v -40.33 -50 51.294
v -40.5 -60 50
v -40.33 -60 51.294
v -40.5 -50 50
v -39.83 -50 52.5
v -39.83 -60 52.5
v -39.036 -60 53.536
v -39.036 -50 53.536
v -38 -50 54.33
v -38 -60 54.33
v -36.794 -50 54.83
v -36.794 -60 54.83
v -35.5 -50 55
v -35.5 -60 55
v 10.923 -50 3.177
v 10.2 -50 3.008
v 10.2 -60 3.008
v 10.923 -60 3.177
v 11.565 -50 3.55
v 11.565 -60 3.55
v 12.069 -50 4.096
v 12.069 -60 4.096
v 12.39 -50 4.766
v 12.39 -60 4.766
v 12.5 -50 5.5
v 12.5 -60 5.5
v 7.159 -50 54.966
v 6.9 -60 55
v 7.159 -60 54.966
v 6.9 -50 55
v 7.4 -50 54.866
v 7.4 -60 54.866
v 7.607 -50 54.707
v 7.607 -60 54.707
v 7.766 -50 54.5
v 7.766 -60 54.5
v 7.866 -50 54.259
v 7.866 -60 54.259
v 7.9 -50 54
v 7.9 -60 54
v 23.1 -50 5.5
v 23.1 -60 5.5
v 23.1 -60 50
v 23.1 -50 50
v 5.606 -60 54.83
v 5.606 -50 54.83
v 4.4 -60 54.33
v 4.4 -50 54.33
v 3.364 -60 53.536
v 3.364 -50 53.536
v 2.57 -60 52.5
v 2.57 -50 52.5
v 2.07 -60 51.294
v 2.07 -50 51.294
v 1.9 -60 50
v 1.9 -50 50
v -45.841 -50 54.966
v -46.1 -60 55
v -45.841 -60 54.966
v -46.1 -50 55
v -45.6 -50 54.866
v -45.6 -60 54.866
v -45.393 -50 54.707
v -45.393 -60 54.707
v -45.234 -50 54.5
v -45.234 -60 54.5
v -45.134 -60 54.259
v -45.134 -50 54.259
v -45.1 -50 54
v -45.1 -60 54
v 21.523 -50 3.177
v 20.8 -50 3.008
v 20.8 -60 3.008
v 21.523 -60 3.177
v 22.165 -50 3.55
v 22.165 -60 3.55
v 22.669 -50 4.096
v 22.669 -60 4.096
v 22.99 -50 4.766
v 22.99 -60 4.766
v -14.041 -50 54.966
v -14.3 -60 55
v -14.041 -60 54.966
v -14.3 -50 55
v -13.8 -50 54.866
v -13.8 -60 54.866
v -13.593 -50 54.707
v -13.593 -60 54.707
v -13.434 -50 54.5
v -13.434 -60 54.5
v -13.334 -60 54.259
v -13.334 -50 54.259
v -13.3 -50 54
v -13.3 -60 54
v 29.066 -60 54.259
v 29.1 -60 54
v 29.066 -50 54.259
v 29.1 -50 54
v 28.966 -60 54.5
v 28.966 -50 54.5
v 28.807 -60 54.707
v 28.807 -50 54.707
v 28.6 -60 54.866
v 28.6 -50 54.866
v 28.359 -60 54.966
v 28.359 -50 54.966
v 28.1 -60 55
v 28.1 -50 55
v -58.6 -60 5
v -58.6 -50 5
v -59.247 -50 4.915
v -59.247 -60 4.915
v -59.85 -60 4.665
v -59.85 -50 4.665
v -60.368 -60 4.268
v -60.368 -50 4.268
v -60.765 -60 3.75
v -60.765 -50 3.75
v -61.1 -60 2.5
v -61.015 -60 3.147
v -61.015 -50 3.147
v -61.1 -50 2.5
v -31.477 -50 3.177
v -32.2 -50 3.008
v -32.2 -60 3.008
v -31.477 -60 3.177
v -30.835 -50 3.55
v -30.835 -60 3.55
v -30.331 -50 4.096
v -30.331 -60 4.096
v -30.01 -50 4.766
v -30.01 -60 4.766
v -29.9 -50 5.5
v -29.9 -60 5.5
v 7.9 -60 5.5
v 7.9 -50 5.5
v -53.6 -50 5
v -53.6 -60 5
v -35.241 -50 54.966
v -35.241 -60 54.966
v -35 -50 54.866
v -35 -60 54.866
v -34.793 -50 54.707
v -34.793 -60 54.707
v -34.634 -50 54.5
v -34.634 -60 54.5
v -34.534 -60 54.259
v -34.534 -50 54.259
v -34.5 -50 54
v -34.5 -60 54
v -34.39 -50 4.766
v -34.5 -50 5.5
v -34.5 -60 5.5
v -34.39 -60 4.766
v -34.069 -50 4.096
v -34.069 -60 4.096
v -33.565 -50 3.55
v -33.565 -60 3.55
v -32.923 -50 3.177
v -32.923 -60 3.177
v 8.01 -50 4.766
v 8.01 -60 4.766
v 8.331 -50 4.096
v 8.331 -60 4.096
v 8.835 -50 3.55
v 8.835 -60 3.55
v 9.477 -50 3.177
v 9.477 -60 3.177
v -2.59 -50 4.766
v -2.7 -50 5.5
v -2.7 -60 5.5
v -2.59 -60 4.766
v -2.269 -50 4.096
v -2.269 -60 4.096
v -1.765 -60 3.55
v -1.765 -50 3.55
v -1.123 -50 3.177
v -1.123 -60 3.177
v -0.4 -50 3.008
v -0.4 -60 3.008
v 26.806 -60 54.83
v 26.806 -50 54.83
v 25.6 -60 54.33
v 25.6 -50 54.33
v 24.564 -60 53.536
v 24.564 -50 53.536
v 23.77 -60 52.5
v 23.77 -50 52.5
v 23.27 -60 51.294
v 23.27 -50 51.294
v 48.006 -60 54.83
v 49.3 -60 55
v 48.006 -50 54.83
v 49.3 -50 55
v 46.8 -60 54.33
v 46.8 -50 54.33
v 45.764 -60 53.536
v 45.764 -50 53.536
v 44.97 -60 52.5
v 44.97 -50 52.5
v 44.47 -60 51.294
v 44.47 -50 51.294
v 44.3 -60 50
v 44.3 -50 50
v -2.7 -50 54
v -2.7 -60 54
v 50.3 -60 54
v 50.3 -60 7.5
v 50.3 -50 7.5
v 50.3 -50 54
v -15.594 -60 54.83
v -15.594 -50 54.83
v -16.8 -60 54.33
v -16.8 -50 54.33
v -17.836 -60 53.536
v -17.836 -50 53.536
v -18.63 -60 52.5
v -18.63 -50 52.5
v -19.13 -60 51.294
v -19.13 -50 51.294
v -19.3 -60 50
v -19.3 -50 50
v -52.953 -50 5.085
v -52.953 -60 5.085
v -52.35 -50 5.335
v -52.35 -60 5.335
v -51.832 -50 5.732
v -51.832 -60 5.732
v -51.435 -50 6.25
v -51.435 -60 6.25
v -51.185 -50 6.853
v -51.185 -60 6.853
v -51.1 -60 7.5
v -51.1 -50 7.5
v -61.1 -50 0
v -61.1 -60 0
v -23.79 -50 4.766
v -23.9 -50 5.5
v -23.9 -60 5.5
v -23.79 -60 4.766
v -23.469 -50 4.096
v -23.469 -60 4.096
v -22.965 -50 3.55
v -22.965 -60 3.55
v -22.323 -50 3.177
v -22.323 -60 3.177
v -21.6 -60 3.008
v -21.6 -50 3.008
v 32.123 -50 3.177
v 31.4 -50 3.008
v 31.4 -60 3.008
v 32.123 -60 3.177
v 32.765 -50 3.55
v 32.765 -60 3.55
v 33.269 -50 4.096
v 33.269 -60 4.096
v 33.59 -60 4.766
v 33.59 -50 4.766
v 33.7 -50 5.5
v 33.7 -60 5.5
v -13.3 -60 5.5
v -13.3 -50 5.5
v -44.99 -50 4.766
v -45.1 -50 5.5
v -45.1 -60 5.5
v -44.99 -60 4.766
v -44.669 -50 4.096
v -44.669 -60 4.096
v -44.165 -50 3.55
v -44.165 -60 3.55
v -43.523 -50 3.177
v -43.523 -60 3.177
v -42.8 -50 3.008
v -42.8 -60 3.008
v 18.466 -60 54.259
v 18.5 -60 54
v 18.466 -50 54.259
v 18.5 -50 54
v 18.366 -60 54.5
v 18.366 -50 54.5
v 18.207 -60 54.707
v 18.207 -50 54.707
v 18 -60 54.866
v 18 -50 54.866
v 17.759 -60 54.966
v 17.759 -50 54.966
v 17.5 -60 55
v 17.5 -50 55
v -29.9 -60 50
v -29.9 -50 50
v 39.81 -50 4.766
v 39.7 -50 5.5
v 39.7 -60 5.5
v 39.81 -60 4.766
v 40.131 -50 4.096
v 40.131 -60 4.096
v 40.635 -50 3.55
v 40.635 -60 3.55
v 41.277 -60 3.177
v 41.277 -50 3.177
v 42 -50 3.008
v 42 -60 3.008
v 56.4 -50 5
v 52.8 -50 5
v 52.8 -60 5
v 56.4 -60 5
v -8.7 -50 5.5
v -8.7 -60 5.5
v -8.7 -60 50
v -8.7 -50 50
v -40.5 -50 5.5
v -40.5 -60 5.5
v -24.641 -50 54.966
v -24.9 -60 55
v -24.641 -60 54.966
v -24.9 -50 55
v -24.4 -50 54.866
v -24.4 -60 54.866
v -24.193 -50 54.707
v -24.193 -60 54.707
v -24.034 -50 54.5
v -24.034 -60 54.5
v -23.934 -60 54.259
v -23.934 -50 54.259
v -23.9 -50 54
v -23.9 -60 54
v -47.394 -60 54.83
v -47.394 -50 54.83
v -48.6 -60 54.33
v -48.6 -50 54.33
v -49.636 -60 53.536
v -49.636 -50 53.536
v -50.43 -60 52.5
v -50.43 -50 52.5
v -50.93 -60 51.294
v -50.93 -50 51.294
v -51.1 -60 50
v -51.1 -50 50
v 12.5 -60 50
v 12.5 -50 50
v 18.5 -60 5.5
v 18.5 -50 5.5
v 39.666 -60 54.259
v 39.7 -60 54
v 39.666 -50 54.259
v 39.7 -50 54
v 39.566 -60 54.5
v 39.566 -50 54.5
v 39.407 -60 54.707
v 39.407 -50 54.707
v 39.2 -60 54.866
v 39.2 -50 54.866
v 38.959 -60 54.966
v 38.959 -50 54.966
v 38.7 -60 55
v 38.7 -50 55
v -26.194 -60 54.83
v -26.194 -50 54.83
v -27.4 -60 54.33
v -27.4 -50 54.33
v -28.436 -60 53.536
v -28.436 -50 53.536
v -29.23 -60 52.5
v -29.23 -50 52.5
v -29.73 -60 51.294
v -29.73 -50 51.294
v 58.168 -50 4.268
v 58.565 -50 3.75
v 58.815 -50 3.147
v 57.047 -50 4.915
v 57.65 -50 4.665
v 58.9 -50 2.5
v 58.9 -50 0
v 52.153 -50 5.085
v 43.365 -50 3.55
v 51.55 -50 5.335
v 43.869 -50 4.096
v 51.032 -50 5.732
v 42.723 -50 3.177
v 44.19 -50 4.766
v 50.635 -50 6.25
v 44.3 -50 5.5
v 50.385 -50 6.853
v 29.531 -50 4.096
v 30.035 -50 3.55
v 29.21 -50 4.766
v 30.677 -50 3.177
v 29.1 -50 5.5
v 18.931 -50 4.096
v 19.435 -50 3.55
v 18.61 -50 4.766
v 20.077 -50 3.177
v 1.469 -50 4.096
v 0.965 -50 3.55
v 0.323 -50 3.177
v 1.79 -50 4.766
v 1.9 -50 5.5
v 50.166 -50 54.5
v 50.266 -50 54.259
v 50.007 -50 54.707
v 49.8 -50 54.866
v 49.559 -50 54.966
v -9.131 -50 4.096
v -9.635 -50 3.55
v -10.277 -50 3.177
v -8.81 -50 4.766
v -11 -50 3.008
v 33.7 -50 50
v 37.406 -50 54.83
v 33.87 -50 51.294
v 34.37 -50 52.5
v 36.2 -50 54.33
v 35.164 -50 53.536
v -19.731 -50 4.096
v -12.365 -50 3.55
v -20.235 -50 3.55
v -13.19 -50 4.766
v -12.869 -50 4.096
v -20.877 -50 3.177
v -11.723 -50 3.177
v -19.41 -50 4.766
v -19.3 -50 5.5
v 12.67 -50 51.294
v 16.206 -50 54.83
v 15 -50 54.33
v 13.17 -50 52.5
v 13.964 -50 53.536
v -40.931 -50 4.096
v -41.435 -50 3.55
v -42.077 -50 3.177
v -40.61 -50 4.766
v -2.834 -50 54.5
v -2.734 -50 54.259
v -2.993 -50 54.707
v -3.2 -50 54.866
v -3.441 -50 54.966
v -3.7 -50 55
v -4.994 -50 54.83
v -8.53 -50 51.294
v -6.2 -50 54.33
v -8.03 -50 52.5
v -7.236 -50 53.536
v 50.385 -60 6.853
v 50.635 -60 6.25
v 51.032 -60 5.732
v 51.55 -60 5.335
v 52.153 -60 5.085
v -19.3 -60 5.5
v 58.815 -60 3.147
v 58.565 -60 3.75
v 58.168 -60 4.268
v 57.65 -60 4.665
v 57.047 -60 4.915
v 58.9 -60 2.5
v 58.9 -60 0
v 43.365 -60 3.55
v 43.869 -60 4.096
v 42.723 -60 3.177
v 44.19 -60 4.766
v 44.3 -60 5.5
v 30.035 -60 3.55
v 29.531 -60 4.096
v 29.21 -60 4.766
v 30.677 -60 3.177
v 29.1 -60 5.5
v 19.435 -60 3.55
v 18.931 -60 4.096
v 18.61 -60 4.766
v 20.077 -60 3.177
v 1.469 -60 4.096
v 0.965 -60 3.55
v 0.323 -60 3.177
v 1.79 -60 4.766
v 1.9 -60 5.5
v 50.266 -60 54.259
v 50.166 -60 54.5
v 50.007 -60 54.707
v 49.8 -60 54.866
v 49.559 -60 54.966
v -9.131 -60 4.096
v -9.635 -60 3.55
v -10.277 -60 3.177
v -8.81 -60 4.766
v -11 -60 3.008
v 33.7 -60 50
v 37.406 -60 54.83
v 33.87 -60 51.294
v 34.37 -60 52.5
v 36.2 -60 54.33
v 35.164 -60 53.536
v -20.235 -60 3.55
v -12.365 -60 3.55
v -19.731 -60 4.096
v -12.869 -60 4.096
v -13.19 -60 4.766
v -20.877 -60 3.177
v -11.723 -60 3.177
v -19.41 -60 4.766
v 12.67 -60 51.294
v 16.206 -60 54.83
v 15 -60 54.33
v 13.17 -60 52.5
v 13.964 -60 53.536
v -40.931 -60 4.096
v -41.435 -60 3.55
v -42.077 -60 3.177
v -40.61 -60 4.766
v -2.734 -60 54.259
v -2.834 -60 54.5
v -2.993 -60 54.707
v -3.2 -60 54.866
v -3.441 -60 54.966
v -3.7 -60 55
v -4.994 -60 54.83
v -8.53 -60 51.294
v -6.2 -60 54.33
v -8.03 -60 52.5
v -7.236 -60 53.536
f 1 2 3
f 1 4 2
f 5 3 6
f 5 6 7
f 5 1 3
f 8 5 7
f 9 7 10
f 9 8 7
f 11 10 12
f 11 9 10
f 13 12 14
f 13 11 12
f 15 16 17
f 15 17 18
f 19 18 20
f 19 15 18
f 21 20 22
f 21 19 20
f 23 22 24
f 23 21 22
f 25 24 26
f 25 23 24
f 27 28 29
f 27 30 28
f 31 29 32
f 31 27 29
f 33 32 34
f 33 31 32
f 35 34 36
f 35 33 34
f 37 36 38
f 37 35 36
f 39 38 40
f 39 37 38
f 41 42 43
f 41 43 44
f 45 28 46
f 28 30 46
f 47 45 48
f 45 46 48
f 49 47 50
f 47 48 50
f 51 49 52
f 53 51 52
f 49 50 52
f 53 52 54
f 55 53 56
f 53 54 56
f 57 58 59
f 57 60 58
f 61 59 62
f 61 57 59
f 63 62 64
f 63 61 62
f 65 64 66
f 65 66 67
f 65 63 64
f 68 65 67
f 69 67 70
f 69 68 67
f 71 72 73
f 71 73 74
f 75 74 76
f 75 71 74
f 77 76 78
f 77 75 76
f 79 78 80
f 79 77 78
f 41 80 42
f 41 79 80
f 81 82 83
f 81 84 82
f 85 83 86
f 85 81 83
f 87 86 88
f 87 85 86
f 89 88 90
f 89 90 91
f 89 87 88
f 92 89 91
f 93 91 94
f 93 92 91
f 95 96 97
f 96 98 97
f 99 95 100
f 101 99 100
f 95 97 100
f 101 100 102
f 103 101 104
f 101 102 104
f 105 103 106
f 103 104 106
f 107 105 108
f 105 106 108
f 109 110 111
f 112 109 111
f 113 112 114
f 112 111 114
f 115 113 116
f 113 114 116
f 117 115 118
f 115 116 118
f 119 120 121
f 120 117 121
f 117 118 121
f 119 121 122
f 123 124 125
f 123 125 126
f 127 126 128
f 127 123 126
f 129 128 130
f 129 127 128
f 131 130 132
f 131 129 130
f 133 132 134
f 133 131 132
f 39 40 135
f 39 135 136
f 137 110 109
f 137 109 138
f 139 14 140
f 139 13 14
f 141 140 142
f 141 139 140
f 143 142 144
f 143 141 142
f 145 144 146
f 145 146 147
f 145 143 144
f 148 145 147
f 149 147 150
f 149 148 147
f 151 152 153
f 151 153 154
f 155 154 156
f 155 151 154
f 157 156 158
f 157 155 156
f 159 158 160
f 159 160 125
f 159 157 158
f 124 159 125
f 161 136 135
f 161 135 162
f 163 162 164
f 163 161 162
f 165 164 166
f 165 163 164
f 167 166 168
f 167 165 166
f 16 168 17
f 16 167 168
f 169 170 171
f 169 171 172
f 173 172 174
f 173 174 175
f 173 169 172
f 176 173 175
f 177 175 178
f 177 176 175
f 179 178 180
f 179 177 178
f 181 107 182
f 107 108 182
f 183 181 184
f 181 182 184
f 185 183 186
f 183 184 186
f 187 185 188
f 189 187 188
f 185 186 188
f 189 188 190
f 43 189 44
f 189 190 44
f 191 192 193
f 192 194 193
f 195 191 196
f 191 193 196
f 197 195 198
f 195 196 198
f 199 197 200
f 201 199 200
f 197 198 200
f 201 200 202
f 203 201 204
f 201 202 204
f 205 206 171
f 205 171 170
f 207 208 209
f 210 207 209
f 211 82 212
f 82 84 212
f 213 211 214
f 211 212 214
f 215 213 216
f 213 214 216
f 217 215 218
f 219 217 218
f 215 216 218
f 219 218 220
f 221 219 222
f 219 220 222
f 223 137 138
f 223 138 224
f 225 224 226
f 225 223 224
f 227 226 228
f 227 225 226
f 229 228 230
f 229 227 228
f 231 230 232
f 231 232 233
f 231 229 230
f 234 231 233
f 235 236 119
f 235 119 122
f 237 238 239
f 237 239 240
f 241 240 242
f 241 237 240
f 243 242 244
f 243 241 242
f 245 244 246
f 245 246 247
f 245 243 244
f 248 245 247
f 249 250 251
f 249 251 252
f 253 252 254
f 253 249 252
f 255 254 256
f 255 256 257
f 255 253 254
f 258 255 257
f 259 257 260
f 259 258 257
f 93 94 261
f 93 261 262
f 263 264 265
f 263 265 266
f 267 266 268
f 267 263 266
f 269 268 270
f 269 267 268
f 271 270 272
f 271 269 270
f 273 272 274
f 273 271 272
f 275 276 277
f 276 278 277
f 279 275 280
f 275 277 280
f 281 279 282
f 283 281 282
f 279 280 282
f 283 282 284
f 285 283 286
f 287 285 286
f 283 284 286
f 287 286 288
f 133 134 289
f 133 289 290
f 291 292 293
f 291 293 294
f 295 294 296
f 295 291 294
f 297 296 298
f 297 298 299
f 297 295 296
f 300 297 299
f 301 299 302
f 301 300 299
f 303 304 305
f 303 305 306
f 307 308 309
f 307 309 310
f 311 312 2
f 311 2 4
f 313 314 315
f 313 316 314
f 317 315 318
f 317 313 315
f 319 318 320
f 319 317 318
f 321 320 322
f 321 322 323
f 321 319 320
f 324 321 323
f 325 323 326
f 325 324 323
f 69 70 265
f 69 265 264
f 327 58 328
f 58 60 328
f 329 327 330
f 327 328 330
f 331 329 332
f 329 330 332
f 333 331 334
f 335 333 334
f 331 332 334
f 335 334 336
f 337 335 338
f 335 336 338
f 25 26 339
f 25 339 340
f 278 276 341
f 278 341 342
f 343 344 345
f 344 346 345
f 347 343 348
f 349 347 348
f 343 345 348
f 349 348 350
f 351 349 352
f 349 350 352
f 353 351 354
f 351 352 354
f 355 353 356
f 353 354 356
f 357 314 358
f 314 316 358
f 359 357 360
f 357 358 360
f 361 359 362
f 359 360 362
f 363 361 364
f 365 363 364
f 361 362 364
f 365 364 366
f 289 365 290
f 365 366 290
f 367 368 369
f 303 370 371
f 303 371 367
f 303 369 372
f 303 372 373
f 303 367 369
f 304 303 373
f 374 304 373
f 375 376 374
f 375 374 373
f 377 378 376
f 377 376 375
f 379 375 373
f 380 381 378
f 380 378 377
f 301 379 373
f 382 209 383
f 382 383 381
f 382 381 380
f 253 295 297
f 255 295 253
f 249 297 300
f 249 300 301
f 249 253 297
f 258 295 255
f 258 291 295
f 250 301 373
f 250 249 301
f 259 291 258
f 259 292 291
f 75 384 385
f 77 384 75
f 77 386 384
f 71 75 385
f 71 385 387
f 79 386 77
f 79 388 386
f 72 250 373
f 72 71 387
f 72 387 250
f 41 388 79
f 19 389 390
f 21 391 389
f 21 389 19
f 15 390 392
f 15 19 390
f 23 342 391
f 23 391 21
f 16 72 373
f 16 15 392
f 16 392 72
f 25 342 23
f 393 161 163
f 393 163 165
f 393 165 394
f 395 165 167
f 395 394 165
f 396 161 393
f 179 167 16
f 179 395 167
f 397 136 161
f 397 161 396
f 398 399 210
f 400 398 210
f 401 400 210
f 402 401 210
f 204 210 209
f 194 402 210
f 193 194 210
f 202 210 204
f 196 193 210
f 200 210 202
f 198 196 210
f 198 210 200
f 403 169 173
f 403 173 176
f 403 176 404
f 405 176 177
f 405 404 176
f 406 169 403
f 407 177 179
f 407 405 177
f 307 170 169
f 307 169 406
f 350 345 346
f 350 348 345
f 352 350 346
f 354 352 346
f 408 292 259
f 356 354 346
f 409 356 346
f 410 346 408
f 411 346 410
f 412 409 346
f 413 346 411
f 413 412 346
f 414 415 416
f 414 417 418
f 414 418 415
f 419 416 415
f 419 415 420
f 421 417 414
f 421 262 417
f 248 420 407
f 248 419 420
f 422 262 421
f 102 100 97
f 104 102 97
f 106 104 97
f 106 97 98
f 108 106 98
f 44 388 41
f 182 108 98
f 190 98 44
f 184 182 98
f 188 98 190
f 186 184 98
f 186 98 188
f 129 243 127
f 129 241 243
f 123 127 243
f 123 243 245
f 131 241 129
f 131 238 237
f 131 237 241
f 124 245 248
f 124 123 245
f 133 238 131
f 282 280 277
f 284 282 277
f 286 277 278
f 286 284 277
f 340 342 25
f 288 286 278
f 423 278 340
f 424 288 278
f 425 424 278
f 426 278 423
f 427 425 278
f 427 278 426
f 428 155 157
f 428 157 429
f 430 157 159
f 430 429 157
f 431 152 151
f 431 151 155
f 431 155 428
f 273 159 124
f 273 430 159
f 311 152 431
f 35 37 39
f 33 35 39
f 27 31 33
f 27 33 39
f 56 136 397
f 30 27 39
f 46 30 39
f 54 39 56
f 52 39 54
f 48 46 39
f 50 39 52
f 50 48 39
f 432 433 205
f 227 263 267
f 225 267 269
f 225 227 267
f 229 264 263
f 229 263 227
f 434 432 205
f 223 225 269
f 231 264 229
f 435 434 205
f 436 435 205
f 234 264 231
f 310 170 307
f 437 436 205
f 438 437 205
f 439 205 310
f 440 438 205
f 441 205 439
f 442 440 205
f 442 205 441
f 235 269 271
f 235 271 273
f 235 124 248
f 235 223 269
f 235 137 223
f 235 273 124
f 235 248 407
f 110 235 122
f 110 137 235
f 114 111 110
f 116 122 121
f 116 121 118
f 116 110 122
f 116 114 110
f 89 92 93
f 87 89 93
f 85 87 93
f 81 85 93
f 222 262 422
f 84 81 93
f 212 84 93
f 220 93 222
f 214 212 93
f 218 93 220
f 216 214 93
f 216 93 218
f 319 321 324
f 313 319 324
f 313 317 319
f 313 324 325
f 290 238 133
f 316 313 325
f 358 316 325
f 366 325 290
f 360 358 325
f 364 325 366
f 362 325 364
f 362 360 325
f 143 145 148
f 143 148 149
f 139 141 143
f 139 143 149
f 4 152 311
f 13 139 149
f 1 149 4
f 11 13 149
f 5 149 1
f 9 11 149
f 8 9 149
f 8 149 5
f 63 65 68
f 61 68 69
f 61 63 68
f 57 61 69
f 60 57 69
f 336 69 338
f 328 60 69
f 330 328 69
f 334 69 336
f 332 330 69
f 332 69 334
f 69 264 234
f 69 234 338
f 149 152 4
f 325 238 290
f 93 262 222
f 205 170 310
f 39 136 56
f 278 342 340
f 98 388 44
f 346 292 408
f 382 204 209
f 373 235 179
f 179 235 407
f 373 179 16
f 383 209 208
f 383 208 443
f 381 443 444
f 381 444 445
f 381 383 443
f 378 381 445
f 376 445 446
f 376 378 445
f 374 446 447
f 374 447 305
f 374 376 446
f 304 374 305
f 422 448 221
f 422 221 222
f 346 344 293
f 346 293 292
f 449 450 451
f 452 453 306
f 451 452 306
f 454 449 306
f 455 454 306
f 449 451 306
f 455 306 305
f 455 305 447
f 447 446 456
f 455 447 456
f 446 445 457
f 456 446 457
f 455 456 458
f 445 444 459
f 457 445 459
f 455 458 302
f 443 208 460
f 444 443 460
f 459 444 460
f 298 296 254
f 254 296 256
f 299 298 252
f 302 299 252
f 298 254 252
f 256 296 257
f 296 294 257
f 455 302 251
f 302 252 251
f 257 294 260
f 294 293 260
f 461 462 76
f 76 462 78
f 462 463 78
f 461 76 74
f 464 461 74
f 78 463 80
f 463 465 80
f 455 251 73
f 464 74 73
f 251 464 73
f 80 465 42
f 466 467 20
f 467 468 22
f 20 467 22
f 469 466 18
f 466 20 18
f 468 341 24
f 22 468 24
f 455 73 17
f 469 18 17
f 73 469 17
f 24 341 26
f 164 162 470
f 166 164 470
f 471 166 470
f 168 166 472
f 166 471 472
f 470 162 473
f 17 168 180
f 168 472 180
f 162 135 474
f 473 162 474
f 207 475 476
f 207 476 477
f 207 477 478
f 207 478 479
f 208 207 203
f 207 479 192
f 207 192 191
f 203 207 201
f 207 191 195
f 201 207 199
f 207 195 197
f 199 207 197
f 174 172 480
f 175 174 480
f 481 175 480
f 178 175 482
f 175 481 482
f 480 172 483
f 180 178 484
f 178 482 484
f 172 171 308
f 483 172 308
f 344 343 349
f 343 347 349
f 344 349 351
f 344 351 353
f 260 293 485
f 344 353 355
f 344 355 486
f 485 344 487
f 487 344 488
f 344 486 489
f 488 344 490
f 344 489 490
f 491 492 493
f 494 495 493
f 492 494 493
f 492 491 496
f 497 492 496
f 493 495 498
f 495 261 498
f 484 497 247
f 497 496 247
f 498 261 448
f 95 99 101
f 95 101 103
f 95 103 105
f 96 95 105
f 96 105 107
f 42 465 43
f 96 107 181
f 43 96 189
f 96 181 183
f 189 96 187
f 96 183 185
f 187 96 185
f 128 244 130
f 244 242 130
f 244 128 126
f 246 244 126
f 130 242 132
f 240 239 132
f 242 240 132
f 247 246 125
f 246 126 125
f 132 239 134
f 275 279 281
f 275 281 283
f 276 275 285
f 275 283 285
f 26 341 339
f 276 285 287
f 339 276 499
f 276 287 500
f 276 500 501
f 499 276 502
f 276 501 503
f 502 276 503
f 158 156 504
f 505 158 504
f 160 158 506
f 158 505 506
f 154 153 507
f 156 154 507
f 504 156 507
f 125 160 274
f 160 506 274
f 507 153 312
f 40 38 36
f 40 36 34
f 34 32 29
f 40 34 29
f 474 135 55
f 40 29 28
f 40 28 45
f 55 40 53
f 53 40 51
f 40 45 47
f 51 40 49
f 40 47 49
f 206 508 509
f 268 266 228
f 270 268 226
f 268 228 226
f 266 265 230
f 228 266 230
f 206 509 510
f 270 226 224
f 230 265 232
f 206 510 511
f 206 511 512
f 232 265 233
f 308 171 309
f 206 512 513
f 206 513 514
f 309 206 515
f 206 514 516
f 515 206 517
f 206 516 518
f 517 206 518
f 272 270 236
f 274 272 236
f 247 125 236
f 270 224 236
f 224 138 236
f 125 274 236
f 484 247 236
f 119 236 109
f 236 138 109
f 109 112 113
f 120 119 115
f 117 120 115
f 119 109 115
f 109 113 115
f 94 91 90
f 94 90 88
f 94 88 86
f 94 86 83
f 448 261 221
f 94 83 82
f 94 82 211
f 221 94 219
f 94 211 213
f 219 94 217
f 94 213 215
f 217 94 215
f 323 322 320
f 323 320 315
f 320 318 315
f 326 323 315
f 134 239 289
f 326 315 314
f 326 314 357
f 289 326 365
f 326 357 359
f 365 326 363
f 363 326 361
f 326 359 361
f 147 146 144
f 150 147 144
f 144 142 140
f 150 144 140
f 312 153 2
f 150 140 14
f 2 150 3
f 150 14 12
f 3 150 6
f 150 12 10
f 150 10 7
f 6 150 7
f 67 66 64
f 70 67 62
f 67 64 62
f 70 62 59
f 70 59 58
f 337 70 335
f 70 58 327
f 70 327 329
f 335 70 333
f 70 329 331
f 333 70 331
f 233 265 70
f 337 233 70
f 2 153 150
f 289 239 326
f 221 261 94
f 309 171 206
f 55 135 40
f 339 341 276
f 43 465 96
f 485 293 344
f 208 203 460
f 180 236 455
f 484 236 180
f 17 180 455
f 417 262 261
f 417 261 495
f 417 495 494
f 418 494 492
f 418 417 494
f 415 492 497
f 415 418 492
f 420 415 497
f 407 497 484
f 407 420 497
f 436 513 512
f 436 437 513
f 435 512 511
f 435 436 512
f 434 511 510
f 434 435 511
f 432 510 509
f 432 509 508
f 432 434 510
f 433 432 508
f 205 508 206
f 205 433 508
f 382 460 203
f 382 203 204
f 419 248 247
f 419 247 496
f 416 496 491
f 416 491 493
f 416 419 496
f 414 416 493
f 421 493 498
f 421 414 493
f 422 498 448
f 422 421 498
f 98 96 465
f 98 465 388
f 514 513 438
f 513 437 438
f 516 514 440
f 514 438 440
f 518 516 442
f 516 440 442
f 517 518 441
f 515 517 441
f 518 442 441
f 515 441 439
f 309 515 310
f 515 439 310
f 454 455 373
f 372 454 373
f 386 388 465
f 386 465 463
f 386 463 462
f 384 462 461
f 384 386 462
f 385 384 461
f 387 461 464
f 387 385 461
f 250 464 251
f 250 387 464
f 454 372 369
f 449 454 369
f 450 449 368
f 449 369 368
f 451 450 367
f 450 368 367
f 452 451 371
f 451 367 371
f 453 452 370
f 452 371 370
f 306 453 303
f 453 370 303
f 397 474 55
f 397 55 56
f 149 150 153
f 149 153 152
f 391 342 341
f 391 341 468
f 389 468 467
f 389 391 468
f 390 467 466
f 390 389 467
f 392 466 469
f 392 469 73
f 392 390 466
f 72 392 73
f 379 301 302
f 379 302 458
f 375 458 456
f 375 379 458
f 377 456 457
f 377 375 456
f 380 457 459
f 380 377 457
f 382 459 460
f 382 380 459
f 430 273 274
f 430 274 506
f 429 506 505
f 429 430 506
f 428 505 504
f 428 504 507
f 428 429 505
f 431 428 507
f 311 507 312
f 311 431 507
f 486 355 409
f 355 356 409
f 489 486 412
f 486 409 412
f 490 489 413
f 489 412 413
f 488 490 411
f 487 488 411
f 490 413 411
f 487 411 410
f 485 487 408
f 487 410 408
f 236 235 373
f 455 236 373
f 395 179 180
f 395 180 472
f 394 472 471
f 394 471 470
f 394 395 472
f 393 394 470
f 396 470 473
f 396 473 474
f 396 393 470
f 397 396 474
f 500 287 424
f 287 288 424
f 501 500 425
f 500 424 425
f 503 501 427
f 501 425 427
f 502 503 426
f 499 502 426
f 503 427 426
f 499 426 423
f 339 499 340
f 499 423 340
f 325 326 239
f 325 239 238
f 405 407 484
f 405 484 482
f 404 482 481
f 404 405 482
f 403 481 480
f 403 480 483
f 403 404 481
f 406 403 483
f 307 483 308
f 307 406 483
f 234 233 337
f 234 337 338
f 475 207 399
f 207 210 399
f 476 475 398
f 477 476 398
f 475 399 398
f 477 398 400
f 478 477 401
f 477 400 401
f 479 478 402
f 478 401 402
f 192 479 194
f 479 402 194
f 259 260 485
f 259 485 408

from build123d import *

# Parameters (mm, degrees)
F0_W        = 120
F0_H        = 10
F1_DEPTH    = 5
F2_W        = 6
F2_H        = 10
F3_DEPTH    = 50
F4_W        = 4.6
F4_H        = 10
F5_DEPTH    = 2
F6_T1_DEPTH = 10
F6_T3_DEPTH = 22.5
F7_R        = 5
F8_R        = 0.99999


# Not quite as in the source:
# - a fillet or chamfer that OpenCascade refuses, or shapes differently, is made with other operations: its cross-section is extruded or revolved along the edge and cut away or added
# - a fillet or chamfer is up to 0.001 mm smaller than in the source, because OpenCascade refuses the exact size


with BuildPart() as f1:
    # F0 (on Top) → F1 (new body)
    with BuildSketch(Plane.XY):
        with Locations((-1.1, -55)):
            Rectangle(F0_W, F0_H)
    extrude(amount=F1_DEPTH)

    # F2 (on face) → F3 (join)
    with BuildSketch(Plane.XY.offset(5)):
        with Locations((-48.1, -55)):
            Rectangle(F2_W, F2_H)
        with Locations((-37.5, -55)):
            Rectangle(F2_W, F2_H)
        with Locations((-26.9, -55)):
            Rectangle(F2_W, F2_H)
        with Locations((-16.3, -55)):
            Rectangle(F2_W, F2_H)
        with Locations((-5.7, -55)):
            Rectangle(F2_W, F2_H)
        with Locations((4.9, -55)):
            Rectangle(F2_W, F2_H)
        with Locations((15.5, -55)):
            Rectangle(F2_W, F2_H)
        with Locations((26.1, -55)):
            Rectangle(F2_W, F2_H)
        with Locations((36.7, -55)):
            Rectangle(F2_W, F2_H)
        with Locations((47.3, -55)):
            Rectangle(F2_W, F2_H)
    extrude(amount=F3_DEPTH)

    # F4 (on face) → F5 (cut)
    with BuildSketch(Plane.XY.offset(5)):
        with Locations((-42.8, -55)):
            Rectangle(F4_W, F4_H)
        with Locations((-32.2, -55)):
            Rectangle(F4_W, F4_H)
        with Locations((-21.6, -55)):
            Rectangle(F4_W, F4_H)
        with Locations((-11, -55)):
            Rectangle(F4_W, F4_H)
        with Locations((-0.4, -55)):
            Rectangle(F4_W, F4_H)
        with Locations((10.2, -55)):
            Rectangle(F4_W, F4_H)
        with Locations((20.8, -55)):
            Rectangle(F4_W, F4_H)
        with Locations((31.4, -55)):
            Rectangle(F4_W, F4_H)
        with Locations((42, -55)):
            Rectangle(F4_W, F4_H)
    extrude(amount=-F5_DEPTH, mode=Mode.SUBTRACT)

    # F6: fillet of radius 2.5 on 22 edges, made by hand

    # F6_s2 → F6_t1 (join)
    with BuildSketch(Plane.XZ.offset(50)):
        with BuildLine():
            ThreePointArc((-45.1, 5.5), (-44.367766953, 3.732233047), (-42.6, 3))
            Line((-42.6, 3), (-45.1, 3))
            Line((-45.1, 3), (-45.1, 5.5))
        make_face()
        with BuildLine():
            ThreePointArc((-43, 3), (-41.232233047, 3.732233047), (-40.5, 5.5))
            Line((-40.5, 5.5), (-40.5, 3))
            Line((-40.5, 3), (-43, 3))
        make_face()
        with BuildLine():
            ThreePointArc((-32.4, 3), (-30.632233047, 3.732233047), (-29.9, 5.5))
            Line((-29.9, 5.5), (-29.9, 3))
            Line((-29.9, 3), (-32.4, 3))
        make_face()
        with BuildLine():
            ThreePointArc((-23.9, 5.5), (-23.167766953, 3.732233047), (-21.4, 3))
            Line((-21.4, 3), (-23.9, 3))
            Line((-23.9, 3), (-23.9, 5.5))
        make_face()
        with BuildLine():
            ThreePointArc((-21.8, 3), (-20.032233047, 3.732233047), (-19.3, 5.5))
            Line((-19.3, 5.5), (-19.3, 3))
            Line((-19.3, 3), (-21.8, 3))
        make_face()
        with BuildLine():
            ThreePointArc((-13.3, 5.5), (-12.567766953, 3.732233047), (-10.8, 3))
            Line((-10.8, 3), (-13.3, 3))
            Line((-13.3, 3), (-13.3, 5.5))
        make_face()
        with BuildLine():
            ThreePointArc((-11.2, 3), (-9.432233047, 3.732233047), (-8.7, 5.5))
            Line((-8.7, 5.5), (-8.7, 3))
            Line((-8.7, 3), (-11.2, 3))
        make_face()
        with BuildLine():
            ThreePointArc((-2.7, 5.5), (-1.967766953, 3.732233047), (-0.2, 3))
            Line((-0.2, 3), (-2.7, 3))
            Line((-2.7, 3), (-2.7, 5.5))
        make_face()
        with BuildLine():
            ThreePointArc((-0.6, 3), (1.167766953, 3.732233047), (1.9, 5.5))
            Line((1.9, 5.5), (1.9, 3))
            Line((1.9, 3), (-0.6, 3))
        make_face()
        with BuildLine():
            ThreePointArc((10, 3), (11.767766953, 3.732233047), (12.5, 5.5))
            Line((12.5, 5.5), (12.5, 3))
            Line((12.5, 3), (10, 3))
        make_face()
        with BuildLine():
            ThreePointArc((20.6, 3), (22.367766953, 3.732233047), (23.1, 5.5))
            Line((23.1, 5.5), (23.1, 3))
            Line((23.1, 3), (20.6, 3))
        make_face()
        with BuildLine():
            ThreePointArc((31.2, 3), (32.967766953, 3.732233047), (33.7, 5.5))
            Line((33.7, 5.5), (33.7, 3))
            Line((33.7, 3), (31.2, 3))
        make_face()
        with BuildLine():
            ThreePointArc((41.8, 3), (43.567766953, 3.732233047), (44.3, 5.5))
            Line((44.3, 5.5), (44.3, 3))
            Line((44.3, 3), (41.8, 3))
        make_face()
        with BuildLine():
            ThreePointArc((39.7, 5.5), (40.432233047, 3.732233047), (42.2, 3))
            Line((42.2, 3), (39.7, 3))
            Line((39.7, 3), (39.7, 5.5))
        make_face()
        with BuildLine():
            ThreePointArc((29.1, 5.5), (29.832233047, 3.732233047), (31.6, 3))
            Line((31.6, 3), (29.1, 3))
            Line((29.1, 3), (29.1, 5.5))
        make_face()
        with BuildLine():
            ThreePointArc((18.5, 5.5), (19.232233047, 3.732233047), (21, 3))
            Line((21, 3), (18.5, 3))
            Line((18.5, 3), (18.5, 5.5))
        make_face()
        with BuildLine():
            ThreePointArc((7.9, 5.5), (8.632233047, 3.732233047), (10.4, 3))
            Line((10.4, 3), (7.9, 3))
            Line((7.9, 3), (7.9, 5.5))
        make_face()
        with BuildLine():
            ThreePointArc((50.3, 7.5), (51.032233047, 5.732233047), (52.8, 5))
            Line((52.8, 5), (50.3, 5))
            Line((50.3, 5), (50.3, 7.5))
        make_face()
        with BuildLine():
            ThreePointArc((-53.6, 5), (-51.832233047, 5.732233047), (-51.1, 7.5))
            Line((-51.1, 7.5), (-51.1, 5))
            Line((-51.1, 5), (-53.6, 5))
        make_face()
        with BuildLine():
            ThreePointArc((-34.5, 5.5), (-33.767766953, 3.732233047), (-32, 3))
            Line((-32, 3), (-34.5, 3))
            Line((-34.5, 3), (-34.5, 5.5))
        make_face()
    extrude(amount=F6_T1_DEPTH)

    # F6_s4 → F6_t3 (cut)
    with BuildSketch(Plane.XZ.offset(43.75)):
        with BuildLine():
            ThreePointArc((58.9, 2.5), (58.167766953, 4.267766953), (56.4, 5))
            Line((56.4, 5), (58.9, 5))
            Line((58.9, 5), (58.9, 2.5))
        make_face()
        with BuildLine():
            ThreePointArc((-58.6, 5), (-60.367766953, 4.267766953), (-61.1, 2.5))
            Line((-61.1, 2.5), (-61.1, 5))
            Line((-61.1, 5), (-58.6, 5))
        make_face()
    extrude(amount=F6_T3_DEPTH, mode=Mode.SUBTRACT)

    # F7
    f7_edges = [f1.edges().sort_by_distance(p)[0] for p in [
        (-51.1, -55, 55),
        (-40.5, -55, 55),
        (-29.9, -55, 55),
        (-19.3, -55, 55),
        (-8.7, -55, 55),
        (1.9, -55, 55),
        (12.5, -55, 55),
        (23.1, -55, 55),
        (33.7, -55, 55),
        (44.3, -55, 55),
    ]]
    fillet(f7_edges, radius=F7_R)

    # F8 (radius 1 in the source; OpenCascade refuses exactly that, so slightly less here)
    f8_edges = [f1.edges().sort_by_distance(p)[0] for p in [
        (-45.1, -55, 55),
        (-34.5, -55, 55),
        (-23.9, -55, 55),
        (-13.3, -55, 55),
        (-2.7, -55, 55),
        (7.9, -55, 55),
        (18.5, -55, 55),
        (29.1, -55, 55),
        (39.7, -55, 55),
        (50.3, -55, 55),
    ]]
    fillet(f8_edges, radius=F8_R)


solid = f1.part
